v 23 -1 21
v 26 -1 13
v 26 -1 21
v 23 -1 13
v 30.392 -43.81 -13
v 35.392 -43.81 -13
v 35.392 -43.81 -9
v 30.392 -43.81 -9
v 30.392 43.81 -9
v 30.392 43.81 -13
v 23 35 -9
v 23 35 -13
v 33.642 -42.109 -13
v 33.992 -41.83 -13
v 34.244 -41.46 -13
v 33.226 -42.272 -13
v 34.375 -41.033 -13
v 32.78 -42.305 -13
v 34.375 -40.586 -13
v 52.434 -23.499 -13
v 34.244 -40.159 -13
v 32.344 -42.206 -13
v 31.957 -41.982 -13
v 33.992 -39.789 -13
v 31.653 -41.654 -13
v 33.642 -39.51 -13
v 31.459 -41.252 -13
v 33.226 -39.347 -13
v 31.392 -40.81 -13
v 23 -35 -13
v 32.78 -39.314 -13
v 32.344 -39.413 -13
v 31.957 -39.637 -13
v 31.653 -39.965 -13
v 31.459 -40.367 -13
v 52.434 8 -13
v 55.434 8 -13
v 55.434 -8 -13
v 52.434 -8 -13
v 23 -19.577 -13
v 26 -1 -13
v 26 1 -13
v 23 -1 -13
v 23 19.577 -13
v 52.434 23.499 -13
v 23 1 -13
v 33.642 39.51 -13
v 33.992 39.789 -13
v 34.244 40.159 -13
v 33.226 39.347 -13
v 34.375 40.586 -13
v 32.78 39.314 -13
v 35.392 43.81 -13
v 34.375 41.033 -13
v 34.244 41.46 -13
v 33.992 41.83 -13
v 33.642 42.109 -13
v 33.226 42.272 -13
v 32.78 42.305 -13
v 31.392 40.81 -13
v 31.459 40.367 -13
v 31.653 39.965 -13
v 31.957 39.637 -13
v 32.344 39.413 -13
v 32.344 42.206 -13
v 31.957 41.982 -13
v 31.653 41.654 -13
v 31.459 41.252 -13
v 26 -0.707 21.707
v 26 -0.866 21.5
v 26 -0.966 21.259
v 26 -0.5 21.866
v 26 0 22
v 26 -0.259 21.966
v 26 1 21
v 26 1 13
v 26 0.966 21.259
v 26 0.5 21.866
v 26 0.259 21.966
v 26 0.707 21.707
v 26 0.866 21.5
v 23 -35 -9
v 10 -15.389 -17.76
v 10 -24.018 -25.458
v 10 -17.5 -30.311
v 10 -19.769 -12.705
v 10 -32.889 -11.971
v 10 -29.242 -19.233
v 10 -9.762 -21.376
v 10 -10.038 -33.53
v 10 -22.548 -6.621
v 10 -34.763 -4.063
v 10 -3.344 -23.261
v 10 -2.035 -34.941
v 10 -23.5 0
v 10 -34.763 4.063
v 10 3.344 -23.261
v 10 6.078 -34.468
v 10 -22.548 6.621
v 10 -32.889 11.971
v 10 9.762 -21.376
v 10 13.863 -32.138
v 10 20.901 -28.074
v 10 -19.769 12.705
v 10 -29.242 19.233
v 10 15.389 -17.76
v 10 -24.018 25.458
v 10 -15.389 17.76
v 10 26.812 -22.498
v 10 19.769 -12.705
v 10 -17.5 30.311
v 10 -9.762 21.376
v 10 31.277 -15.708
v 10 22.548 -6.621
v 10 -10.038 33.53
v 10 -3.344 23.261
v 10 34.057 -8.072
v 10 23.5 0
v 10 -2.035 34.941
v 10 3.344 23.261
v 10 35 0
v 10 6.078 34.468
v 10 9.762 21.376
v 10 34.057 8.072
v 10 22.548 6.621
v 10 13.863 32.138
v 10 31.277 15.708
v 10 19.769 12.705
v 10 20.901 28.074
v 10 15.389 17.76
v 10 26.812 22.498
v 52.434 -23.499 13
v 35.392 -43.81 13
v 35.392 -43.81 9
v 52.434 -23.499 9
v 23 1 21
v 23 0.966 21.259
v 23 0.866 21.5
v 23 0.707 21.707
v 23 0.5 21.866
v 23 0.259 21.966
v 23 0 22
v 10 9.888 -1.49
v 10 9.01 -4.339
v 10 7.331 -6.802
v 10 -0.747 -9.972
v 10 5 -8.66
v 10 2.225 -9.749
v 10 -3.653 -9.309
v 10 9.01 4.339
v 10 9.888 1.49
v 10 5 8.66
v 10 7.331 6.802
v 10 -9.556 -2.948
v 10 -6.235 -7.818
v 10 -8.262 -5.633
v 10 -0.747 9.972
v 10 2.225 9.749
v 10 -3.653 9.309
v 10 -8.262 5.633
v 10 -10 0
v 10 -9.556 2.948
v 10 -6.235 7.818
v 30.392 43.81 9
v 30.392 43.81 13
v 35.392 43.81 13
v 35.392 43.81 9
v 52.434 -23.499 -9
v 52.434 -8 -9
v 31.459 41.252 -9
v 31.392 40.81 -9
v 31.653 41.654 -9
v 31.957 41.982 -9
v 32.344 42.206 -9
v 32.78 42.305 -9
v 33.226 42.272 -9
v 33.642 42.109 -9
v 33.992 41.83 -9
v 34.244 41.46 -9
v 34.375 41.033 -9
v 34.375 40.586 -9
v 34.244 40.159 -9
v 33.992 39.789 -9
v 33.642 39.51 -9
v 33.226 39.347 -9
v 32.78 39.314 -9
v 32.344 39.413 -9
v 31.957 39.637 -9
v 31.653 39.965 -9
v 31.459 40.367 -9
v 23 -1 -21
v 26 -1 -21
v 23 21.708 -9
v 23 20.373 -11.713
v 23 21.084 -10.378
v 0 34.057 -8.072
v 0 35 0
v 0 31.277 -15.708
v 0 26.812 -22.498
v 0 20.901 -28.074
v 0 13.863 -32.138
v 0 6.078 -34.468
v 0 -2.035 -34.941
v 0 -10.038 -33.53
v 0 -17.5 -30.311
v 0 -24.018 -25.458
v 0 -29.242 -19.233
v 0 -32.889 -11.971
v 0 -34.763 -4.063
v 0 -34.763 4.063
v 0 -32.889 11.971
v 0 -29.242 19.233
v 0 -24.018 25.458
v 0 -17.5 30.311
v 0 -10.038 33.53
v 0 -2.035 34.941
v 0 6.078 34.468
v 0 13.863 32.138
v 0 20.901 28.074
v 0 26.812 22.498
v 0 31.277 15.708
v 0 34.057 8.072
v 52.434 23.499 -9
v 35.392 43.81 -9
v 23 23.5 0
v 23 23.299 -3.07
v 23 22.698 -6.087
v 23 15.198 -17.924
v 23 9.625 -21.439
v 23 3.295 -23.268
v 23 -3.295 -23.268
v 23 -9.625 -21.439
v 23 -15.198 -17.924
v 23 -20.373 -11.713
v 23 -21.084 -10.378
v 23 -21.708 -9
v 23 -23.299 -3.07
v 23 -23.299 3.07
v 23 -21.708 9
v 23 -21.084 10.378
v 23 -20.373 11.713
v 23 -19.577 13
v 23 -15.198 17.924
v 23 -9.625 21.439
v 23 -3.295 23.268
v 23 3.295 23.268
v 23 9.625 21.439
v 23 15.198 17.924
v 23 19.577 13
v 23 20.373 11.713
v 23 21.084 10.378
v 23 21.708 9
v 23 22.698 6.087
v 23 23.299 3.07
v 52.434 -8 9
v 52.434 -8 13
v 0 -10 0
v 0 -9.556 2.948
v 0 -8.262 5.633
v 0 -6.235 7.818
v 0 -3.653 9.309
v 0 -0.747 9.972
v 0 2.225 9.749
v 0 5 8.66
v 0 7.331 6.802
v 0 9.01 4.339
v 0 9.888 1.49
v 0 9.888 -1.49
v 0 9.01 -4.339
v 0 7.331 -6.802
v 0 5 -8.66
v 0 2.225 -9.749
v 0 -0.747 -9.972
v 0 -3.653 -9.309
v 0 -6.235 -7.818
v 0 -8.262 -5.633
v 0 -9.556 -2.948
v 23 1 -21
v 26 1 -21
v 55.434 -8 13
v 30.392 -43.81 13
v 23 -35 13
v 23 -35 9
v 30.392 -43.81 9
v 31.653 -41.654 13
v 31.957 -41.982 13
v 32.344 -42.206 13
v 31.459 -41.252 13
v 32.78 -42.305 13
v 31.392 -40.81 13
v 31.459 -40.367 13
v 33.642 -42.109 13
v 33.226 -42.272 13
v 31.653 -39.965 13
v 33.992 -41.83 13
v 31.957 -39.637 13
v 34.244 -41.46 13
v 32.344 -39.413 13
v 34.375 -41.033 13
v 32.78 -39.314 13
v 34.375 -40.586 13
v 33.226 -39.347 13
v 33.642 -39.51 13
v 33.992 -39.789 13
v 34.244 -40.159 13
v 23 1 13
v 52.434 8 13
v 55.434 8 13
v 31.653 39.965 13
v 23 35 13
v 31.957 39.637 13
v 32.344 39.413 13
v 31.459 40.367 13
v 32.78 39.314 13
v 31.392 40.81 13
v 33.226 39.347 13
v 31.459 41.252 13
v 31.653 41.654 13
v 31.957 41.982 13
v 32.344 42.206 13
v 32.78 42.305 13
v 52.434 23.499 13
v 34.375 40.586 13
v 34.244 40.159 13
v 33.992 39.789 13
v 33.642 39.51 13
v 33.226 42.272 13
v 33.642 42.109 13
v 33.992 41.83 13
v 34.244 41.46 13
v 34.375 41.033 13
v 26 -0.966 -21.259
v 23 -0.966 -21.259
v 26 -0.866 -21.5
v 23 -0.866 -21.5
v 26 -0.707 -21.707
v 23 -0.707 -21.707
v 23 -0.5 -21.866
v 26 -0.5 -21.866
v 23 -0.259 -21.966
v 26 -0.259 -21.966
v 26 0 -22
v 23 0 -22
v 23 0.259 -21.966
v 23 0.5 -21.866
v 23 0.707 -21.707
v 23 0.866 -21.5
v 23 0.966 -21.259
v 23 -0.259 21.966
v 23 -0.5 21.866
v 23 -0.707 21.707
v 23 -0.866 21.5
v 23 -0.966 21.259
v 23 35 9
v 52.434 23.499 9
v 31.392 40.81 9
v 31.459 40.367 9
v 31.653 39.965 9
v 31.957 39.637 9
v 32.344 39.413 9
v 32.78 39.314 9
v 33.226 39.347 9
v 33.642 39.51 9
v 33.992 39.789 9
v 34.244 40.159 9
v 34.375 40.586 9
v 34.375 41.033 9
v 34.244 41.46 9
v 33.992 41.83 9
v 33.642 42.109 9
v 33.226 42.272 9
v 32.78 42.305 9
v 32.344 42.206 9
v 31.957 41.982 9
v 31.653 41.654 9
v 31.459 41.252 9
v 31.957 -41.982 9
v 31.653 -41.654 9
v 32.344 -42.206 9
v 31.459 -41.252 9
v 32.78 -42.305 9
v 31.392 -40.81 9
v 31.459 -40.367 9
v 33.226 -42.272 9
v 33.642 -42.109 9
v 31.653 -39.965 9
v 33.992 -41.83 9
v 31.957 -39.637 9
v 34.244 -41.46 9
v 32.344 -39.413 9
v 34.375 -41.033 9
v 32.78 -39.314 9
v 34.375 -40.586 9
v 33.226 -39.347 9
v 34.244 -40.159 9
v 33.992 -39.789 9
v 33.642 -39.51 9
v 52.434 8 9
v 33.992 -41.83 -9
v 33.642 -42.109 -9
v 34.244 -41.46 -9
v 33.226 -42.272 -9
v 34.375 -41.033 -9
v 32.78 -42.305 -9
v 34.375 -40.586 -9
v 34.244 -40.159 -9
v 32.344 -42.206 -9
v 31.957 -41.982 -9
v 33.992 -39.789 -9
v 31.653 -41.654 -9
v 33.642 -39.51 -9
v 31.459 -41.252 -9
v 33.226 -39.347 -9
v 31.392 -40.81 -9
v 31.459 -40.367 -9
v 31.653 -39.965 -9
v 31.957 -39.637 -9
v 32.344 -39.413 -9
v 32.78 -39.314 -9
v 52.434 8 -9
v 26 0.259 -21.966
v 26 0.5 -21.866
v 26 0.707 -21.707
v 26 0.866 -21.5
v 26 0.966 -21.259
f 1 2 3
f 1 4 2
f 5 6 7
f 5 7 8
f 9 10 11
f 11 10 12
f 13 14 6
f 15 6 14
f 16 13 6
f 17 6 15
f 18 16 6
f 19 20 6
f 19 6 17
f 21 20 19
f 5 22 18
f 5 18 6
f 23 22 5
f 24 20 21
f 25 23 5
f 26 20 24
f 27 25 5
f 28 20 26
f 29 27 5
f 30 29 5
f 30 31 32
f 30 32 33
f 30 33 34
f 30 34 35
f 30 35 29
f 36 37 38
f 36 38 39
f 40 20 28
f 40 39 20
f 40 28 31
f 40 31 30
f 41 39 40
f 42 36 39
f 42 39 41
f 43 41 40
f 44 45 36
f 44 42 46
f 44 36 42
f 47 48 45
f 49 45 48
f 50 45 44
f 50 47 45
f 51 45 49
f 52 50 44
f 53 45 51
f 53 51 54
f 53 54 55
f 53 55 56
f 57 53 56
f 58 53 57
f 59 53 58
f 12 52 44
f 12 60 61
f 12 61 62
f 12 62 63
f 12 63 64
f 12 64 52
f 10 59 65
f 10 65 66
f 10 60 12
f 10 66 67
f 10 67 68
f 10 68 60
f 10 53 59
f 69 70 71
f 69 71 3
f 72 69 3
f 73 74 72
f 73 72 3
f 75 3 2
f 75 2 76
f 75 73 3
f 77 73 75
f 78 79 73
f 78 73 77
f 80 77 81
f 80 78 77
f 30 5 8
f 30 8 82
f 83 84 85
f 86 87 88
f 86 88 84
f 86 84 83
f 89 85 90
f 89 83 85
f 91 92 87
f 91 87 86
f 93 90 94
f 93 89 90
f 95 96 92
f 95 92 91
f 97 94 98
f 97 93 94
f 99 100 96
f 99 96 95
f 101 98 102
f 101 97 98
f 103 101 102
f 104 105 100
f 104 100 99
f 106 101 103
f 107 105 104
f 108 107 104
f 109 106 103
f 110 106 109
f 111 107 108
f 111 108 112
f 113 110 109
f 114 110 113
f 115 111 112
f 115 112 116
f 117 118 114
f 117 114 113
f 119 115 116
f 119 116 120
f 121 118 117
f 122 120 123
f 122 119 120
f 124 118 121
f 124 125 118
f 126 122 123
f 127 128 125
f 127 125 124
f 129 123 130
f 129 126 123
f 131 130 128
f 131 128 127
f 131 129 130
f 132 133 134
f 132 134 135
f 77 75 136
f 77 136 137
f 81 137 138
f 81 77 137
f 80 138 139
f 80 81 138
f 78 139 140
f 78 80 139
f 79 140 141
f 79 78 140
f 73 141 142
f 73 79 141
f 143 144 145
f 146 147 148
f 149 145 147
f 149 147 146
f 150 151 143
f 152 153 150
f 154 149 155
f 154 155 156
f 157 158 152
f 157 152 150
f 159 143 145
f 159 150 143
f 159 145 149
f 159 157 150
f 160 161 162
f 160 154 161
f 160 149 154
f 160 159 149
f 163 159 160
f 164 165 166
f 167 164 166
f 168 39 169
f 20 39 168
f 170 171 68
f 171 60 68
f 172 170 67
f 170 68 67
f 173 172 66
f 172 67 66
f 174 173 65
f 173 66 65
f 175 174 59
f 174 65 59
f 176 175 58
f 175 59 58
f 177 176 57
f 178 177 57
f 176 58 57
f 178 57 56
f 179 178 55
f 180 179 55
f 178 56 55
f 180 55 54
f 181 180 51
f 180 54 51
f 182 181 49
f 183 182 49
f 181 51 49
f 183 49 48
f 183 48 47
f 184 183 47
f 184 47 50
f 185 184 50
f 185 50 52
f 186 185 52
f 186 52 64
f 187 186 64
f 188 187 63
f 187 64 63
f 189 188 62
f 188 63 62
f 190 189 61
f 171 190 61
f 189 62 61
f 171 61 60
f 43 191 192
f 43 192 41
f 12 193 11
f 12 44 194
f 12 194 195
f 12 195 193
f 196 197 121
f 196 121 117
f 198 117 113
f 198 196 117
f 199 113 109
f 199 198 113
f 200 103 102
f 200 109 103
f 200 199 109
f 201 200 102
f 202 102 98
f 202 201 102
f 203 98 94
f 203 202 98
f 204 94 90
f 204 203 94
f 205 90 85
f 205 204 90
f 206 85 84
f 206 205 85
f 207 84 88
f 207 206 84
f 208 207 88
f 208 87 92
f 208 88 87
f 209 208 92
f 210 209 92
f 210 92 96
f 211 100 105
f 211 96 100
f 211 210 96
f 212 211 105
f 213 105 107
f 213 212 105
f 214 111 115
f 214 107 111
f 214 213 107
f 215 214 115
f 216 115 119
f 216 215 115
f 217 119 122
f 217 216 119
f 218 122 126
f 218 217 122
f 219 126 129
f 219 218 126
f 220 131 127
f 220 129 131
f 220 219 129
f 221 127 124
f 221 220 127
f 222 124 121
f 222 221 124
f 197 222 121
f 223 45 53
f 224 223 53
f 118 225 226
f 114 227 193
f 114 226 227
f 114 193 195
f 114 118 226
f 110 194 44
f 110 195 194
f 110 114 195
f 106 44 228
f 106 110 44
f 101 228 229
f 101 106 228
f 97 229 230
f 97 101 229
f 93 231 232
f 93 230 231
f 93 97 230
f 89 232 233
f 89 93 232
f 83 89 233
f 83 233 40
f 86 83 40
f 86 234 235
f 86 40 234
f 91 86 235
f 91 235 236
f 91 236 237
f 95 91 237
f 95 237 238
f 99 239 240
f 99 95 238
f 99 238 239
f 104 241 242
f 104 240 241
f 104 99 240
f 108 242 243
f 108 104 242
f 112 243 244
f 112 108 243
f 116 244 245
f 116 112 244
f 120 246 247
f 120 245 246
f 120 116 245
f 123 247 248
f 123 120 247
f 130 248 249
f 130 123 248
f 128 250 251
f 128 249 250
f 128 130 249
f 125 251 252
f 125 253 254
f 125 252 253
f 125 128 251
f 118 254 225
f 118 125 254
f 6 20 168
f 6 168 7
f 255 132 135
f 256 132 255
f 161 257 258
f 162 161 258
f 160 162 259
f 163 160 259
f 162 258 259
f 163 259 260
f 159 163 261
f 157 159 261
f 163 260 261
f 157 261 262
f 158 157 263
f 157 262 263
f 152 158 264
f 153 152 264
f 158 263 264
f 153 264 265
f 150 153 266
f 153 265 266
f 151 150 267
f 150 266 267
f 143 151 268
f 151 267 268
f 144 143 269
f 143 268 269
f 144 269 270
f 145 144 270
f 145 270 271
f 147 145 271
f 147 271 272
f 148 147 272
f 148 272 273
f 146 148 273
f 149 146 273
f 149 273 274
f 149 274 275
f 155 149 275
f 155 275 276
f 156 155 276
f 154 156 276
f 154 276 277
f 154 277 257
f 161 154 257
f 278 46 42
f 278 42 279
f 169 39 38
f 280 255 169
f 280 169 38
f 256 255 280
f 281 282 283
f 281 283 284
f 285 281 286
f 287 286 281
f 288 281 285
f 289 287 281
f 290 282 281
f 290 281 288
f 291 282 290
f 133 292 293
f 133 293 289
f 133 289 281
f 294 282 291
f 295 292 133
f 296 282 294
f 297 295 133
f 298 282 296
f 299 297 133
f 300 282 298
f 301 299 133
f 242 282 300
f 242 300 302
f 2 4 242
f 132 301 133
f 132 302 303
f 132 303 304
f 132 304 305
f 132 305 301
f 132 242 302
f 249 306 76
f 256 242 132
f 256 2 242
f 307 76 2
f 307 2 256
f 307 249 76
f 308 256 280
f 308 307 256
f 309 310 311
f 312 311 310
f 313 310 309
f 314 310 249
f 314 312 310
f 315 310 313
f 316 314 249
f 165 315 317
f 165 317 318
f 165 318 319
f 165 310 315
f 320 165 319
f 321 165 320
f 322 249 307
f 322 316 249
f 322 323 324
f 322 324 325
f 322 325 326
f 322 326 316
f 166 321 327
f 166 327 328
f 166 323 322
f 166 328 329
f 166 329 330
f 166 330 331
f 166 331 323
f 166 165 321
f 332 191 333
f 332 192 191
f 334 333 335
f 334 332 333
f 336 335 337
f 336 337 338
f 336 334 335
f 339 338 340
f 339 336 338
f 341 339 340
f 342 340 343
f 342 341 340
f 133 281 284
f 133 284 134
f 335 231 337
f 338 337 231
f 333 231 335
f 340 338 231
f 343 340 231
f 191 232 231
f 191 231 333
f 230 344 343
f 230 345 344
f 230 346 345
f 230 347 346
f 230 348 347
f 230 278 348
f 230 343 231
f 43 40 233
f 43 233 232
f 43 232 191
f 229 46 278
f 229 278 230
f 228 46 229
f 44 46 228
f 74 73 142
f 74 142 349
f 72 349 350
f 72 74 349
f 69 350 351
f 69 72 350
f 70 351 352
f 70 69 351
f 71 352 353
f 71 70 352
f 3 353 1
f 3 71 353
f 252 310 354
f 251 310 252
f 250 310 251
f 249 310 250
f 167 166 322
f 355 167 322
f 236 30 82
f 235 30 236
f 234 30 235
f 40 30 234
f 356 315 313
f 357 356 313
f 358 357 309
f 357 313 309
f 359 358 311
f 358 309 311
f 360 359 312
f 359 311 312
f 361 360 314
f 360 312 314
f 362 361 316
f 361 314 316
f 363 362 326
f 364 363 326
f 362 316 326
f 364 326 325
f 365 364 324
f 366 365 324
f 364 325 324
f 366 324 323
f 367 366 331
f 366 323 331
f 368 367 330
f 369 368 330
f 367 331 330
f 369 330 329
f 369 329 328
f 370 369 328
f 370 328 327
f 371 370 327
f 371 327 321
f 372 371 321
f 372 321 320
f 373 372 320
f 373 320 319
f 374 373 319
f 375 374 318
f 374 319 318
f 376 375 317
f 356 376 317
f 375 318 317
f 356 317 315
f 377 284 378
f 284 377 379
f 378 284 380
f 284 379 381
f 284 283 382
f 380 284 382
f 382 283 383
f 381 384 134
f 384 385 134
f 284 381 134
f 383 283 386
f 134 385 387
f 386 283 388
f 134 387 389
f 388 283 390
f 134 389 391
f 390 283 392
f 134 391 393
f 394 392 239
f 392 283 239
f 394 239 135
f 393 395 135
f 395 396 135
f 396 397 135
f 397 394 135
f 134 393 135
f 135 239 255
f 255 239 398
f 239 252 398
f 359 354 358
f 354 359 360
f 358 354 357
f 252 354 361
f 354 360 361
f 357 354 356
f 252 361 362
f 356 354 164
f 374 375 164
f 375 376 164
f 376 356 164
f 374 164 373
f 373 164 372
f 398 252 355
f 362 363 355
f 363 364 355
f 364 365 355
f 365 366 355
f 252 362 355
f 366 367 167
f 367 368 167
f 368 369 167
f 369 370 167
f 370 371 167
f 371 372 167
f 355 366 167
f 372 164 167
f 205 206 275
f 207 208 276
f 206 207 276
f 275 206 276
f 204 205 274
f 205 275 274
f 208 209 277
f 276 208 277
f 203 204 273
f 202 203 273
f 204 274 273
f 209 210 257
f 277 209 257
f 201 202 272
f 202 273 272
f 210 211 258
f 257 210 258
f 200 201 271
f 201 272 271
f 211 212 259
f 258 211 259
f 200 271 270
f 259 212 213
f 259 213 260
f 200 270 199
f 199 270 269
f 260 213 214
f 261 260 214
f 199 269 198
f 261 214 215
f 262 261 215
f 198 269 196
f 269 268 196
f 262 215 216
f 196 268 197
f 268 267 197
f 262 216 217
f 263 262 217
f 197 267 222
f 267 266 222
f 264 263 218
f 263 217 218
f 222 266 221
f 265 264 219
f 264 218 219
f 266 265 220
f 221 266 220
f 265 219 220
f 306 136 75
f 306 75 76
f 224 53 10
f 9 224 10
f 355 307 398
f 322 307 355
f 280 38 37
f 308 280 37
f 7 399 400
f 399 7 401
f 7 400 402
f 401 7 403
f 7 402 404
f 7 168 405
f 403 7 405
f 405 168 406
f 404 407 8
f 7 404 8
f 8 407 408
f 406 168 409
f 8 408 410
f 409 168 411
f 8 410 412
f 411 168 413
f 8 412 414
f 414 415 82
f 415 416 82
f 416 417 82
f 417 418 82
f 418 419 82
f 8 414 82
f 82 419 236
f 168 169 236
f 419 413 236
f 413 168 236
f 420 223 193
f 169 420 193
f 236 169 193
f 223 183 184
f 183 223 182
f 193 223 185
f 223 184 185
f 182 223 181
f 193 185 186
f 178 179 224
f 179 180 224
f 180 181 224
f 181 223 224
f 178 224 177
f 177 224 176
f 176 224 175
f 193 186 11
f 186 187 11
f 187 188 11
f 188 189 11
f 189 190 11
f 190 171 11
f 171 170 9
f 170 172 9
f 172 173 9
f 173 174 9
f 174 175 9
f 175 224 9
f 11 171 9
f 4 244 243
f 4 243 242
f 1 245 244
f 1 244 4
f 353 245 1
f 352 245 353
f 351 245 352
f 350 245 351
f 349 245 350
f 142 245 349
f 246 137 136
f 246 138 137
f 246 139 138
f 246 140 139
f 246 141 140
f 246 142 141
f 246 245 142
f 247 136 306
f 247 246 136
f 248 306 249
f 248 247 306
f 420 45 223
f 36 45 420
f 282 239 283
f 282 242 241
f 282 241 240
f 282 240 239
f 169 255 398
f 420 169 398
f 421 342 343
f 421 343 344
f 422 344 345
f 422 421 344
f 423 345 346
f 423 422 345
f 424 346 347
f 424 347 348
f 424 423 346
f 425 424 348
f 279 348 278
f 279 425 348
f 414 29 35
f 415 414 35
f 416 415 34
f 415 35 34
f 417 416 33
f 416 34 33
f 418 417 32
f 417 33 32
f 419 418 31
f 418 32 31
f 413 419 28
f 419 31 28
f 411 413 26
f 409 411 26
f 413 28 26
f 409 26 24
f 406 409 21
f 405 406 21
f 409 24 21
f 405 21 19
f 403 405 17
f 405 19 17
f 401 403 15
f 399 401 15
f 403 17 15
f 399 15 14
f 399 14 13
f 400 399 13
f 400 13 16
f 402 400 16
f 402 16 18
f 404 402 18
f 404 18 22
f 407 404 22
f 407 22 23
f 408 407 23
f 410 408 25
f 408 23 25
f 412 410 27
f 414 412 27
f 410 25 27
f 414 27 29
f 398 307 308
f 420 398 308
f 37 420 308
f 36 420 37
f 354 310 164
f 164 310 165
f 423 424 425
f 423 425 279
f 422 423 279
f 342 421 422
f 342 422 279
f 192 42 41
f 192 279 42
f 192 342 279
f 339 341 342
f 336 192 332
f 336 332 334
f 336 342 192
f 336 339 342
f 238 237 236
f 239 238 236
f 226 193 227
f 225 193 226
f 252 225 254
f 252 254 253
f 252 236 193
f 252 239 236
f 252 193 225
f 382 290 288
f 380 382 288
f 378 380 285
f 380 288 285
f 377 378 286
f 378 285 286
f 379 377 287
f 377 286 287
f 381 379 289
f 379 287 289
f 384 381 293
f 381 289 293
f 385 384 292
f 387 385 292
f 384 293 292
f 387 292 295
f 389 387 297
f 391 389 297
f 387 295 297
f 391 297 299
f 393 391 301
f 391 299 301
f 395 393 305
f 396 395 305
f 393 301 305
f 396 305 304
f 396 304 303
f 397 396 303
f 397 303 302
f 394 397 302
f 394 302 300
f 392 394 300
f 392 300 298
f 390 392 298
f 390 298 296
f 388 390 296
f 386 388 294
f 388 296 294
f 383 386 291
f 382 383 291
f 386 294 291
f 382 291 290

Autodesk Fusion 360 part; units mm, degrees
sketch "Sketch1" plane through (0, 0, 0) normal (1, 0, 0) x (0, 1, 0)
  circle A0 centre (0, 0) radius 35
  dimension "d1" = 70
extrude "Extrude1" add sketch "Sketch1" along normal blind 10 in component "Component"
sketch "Sketch2" plane through (10, 0, 0) normal (1, 0, 0) x (0, 1, 0)
  circle A0 centre (0, 0) radius 35
  circle A1 centre (0, 0) radius 23.5
  dimension "d4" = 47
extrude "Extrude2" add sketch "Sketch2" along normal blind 13 contours A1 in component "Component"
ref_plane "WorkPlane1" through (0, 0, 13) normal (0, 0, 1) x (1, 0, 0)
sketch "Sketch3" plane through (0, 0, 13) normal (0, 0, 1) x (1, 0, 0)
  line L0 (23, 0) -> (23, -35)
  line L1 (23, -35) -> (23, -45)
  line L2 (23, -35) -> (30.3921, -43.8095)
  line L3 (23, -35) -> (34.5, -35) construction
  line L4 (23, 0) -> (60, 0)
  line L5 (23, -23.4992) -> (67, -23.4992)
  line L6 (30.3921, -43.8095) -> (35.3921, -43.8095)
  line L7 (35.3921, -43.8095) -> (52.4344, -23.4992)
  line L8 (35.3921, -43.8095) -> (45, -43.8095)
  line L9 (52.4344, -23.4992) -> (52.4344, 0)
  line L10 (23, 0) -> (23, 35)
  line L11 (23, 35) -> (30.3921, 43.8095)
  line L12 (30.3921, 43.8095) -> (35.3921, 43.8095)
  line L13 (52.4344, 23.4992) -> (52.4344, 0)
  line L14 (35.3921, 43.8095) -> (52.4344, 23.4992)
  dimension "d8" = 35
  dimension "d9" = 10
  dimension "d10" = 50
  dimension "d11" = 11.5
  dimension "d13" = 37
  dimension "d14" = 44
  dimension "d15" = 5
  dimension "d16" = 50
extrude "Extrude3" add sketch "Sketch3" against normal blind 4 in component "Component"
sketch "Sketch4" plane through (0, 0, 13) normal (0, 0, 1) x (-1, 0, 0)
  line L0 (-23, -35) -> (-23, -19.5768)
  line L1 (-23, -19.5768) -> (-23, 19.5768)
  line L2 (-23, 19.5768) -> (-23, 35)
  line L3 (-23, 35) -> (-30.3921, 43.8095)
  line L4 (-30.3921, 43.8095) -> (-35.3921, 43.8095)
  line L5 (-35.3921, 43.8095) -> (-52.4344, 23.4992)
  line L6 (-52.4344, 23.4992) -> (-52.4344, -23.4992)
  line L7 (-52.4344, -23.4992) -> (-35.3921, -43.8095)
  line L8 (-35.3921, -43.8095) -> (-30.3921, -43.8095)
  line L9 (-30.3921, -43.8095) -> (-23, -35)
  line L10 (-32.8921, 43.8095) -> (-32.8921, 40.8095)
  circle A0 centre (-32.8921, 40.8095) radius 1.5
  dimension "d19" = 3
  dimension "d20" = 3
extrude "Extrude4" cut sketch "Sketch4" against normal blind 7 contours A0 in component "Component"
mirror "Mirror1" about plane through (0, 0, 0) normal (0, 1, 0) of "Extrude4" in component "Component"
mirror "Mirror2" about plane through (0, 0, 0) normal (0, 0, 1) of "Extrude3", "Mirror1", "Extrude4" in component "Component"
sketch "Sketch5" plane through (23, 0, 0) normal (1, 0, 0) x (0, 1, 0)
  line L0 (-19.5768, 13) -> (19.5768, 13)
  arc A0 (19.5768, 13) -> (-19.5768, 13) centre (0, 0) ccw
  line L1 (0, 13) -> (0, 23.5)
  line L2 (0, 13) -> (-1, 13)
  line L3 (-1, 13) -> (-1, 22)
  line L4 (-1, 22) -> (1, 22)
  line L5 (1, 22) -> (1, 13)
extrude "Extrude5" add sketch "Sketch5" along normal blind 3 contours L0 L1 L2 L3 L4 | L0 L1 L4 L5 in component "Component"
fillet "Fillet1" radius 1 2 edges at (24.5, 1, 22) (24.5, -1, 22) in component "Component"
mirror "Mirror3" about plane through (0, 0, 0) normal (0, 0, 1) of "Extrude5", "Fillet1" in component "Component"
sketch "Sketch6" plane through (52.4344, 0, 0) normal (1, 0, 0) x (0, 1, 0)
  line L0 (23.4992, 13) -> (-23.4992, 13)
  line L1 (-23.4992, 13) -> (-23.4992, 9)
  line L2 (-23.4992, 9) -> (23.4992, 9)
  line L3 (23.4992, 9) -> (23.4992, 13)
  line L4 (8, -13) -> (-8, -13)
  line L5 (-8, -13) -> (-8, 13)
  line L6 (-8, 13) -> (8, 13)
  line L7 (8, 13) -> (8, -13)
  line L8 (8, -13) -> (-8, 13) construction
  line L9 (-8, -13) -> (8, 13) construction
extrude "Extrude6" add sketch "Sketch6" along normal blind 3 contours L0 L2 L5 L6 L7 | L2 L4 L5 L7 in component "Component"
sketch "Sketch7" plane through (0, 0, 0) normal (-1, 0, 0) x (0, -1, 0)
  circle A0 centre (0, 0) radius 35
  circle A1 centre (0, 0) radius 10
  dimension "d35" = 20
extrude "Extrude7" cut sketch "Sketch7" against normal blind 10 contours A1 in component "Component"
component "Component" placed x (1, 0, 0) y (0, 1, 0) z (0, 0, 1) at (0, 0, 0)
